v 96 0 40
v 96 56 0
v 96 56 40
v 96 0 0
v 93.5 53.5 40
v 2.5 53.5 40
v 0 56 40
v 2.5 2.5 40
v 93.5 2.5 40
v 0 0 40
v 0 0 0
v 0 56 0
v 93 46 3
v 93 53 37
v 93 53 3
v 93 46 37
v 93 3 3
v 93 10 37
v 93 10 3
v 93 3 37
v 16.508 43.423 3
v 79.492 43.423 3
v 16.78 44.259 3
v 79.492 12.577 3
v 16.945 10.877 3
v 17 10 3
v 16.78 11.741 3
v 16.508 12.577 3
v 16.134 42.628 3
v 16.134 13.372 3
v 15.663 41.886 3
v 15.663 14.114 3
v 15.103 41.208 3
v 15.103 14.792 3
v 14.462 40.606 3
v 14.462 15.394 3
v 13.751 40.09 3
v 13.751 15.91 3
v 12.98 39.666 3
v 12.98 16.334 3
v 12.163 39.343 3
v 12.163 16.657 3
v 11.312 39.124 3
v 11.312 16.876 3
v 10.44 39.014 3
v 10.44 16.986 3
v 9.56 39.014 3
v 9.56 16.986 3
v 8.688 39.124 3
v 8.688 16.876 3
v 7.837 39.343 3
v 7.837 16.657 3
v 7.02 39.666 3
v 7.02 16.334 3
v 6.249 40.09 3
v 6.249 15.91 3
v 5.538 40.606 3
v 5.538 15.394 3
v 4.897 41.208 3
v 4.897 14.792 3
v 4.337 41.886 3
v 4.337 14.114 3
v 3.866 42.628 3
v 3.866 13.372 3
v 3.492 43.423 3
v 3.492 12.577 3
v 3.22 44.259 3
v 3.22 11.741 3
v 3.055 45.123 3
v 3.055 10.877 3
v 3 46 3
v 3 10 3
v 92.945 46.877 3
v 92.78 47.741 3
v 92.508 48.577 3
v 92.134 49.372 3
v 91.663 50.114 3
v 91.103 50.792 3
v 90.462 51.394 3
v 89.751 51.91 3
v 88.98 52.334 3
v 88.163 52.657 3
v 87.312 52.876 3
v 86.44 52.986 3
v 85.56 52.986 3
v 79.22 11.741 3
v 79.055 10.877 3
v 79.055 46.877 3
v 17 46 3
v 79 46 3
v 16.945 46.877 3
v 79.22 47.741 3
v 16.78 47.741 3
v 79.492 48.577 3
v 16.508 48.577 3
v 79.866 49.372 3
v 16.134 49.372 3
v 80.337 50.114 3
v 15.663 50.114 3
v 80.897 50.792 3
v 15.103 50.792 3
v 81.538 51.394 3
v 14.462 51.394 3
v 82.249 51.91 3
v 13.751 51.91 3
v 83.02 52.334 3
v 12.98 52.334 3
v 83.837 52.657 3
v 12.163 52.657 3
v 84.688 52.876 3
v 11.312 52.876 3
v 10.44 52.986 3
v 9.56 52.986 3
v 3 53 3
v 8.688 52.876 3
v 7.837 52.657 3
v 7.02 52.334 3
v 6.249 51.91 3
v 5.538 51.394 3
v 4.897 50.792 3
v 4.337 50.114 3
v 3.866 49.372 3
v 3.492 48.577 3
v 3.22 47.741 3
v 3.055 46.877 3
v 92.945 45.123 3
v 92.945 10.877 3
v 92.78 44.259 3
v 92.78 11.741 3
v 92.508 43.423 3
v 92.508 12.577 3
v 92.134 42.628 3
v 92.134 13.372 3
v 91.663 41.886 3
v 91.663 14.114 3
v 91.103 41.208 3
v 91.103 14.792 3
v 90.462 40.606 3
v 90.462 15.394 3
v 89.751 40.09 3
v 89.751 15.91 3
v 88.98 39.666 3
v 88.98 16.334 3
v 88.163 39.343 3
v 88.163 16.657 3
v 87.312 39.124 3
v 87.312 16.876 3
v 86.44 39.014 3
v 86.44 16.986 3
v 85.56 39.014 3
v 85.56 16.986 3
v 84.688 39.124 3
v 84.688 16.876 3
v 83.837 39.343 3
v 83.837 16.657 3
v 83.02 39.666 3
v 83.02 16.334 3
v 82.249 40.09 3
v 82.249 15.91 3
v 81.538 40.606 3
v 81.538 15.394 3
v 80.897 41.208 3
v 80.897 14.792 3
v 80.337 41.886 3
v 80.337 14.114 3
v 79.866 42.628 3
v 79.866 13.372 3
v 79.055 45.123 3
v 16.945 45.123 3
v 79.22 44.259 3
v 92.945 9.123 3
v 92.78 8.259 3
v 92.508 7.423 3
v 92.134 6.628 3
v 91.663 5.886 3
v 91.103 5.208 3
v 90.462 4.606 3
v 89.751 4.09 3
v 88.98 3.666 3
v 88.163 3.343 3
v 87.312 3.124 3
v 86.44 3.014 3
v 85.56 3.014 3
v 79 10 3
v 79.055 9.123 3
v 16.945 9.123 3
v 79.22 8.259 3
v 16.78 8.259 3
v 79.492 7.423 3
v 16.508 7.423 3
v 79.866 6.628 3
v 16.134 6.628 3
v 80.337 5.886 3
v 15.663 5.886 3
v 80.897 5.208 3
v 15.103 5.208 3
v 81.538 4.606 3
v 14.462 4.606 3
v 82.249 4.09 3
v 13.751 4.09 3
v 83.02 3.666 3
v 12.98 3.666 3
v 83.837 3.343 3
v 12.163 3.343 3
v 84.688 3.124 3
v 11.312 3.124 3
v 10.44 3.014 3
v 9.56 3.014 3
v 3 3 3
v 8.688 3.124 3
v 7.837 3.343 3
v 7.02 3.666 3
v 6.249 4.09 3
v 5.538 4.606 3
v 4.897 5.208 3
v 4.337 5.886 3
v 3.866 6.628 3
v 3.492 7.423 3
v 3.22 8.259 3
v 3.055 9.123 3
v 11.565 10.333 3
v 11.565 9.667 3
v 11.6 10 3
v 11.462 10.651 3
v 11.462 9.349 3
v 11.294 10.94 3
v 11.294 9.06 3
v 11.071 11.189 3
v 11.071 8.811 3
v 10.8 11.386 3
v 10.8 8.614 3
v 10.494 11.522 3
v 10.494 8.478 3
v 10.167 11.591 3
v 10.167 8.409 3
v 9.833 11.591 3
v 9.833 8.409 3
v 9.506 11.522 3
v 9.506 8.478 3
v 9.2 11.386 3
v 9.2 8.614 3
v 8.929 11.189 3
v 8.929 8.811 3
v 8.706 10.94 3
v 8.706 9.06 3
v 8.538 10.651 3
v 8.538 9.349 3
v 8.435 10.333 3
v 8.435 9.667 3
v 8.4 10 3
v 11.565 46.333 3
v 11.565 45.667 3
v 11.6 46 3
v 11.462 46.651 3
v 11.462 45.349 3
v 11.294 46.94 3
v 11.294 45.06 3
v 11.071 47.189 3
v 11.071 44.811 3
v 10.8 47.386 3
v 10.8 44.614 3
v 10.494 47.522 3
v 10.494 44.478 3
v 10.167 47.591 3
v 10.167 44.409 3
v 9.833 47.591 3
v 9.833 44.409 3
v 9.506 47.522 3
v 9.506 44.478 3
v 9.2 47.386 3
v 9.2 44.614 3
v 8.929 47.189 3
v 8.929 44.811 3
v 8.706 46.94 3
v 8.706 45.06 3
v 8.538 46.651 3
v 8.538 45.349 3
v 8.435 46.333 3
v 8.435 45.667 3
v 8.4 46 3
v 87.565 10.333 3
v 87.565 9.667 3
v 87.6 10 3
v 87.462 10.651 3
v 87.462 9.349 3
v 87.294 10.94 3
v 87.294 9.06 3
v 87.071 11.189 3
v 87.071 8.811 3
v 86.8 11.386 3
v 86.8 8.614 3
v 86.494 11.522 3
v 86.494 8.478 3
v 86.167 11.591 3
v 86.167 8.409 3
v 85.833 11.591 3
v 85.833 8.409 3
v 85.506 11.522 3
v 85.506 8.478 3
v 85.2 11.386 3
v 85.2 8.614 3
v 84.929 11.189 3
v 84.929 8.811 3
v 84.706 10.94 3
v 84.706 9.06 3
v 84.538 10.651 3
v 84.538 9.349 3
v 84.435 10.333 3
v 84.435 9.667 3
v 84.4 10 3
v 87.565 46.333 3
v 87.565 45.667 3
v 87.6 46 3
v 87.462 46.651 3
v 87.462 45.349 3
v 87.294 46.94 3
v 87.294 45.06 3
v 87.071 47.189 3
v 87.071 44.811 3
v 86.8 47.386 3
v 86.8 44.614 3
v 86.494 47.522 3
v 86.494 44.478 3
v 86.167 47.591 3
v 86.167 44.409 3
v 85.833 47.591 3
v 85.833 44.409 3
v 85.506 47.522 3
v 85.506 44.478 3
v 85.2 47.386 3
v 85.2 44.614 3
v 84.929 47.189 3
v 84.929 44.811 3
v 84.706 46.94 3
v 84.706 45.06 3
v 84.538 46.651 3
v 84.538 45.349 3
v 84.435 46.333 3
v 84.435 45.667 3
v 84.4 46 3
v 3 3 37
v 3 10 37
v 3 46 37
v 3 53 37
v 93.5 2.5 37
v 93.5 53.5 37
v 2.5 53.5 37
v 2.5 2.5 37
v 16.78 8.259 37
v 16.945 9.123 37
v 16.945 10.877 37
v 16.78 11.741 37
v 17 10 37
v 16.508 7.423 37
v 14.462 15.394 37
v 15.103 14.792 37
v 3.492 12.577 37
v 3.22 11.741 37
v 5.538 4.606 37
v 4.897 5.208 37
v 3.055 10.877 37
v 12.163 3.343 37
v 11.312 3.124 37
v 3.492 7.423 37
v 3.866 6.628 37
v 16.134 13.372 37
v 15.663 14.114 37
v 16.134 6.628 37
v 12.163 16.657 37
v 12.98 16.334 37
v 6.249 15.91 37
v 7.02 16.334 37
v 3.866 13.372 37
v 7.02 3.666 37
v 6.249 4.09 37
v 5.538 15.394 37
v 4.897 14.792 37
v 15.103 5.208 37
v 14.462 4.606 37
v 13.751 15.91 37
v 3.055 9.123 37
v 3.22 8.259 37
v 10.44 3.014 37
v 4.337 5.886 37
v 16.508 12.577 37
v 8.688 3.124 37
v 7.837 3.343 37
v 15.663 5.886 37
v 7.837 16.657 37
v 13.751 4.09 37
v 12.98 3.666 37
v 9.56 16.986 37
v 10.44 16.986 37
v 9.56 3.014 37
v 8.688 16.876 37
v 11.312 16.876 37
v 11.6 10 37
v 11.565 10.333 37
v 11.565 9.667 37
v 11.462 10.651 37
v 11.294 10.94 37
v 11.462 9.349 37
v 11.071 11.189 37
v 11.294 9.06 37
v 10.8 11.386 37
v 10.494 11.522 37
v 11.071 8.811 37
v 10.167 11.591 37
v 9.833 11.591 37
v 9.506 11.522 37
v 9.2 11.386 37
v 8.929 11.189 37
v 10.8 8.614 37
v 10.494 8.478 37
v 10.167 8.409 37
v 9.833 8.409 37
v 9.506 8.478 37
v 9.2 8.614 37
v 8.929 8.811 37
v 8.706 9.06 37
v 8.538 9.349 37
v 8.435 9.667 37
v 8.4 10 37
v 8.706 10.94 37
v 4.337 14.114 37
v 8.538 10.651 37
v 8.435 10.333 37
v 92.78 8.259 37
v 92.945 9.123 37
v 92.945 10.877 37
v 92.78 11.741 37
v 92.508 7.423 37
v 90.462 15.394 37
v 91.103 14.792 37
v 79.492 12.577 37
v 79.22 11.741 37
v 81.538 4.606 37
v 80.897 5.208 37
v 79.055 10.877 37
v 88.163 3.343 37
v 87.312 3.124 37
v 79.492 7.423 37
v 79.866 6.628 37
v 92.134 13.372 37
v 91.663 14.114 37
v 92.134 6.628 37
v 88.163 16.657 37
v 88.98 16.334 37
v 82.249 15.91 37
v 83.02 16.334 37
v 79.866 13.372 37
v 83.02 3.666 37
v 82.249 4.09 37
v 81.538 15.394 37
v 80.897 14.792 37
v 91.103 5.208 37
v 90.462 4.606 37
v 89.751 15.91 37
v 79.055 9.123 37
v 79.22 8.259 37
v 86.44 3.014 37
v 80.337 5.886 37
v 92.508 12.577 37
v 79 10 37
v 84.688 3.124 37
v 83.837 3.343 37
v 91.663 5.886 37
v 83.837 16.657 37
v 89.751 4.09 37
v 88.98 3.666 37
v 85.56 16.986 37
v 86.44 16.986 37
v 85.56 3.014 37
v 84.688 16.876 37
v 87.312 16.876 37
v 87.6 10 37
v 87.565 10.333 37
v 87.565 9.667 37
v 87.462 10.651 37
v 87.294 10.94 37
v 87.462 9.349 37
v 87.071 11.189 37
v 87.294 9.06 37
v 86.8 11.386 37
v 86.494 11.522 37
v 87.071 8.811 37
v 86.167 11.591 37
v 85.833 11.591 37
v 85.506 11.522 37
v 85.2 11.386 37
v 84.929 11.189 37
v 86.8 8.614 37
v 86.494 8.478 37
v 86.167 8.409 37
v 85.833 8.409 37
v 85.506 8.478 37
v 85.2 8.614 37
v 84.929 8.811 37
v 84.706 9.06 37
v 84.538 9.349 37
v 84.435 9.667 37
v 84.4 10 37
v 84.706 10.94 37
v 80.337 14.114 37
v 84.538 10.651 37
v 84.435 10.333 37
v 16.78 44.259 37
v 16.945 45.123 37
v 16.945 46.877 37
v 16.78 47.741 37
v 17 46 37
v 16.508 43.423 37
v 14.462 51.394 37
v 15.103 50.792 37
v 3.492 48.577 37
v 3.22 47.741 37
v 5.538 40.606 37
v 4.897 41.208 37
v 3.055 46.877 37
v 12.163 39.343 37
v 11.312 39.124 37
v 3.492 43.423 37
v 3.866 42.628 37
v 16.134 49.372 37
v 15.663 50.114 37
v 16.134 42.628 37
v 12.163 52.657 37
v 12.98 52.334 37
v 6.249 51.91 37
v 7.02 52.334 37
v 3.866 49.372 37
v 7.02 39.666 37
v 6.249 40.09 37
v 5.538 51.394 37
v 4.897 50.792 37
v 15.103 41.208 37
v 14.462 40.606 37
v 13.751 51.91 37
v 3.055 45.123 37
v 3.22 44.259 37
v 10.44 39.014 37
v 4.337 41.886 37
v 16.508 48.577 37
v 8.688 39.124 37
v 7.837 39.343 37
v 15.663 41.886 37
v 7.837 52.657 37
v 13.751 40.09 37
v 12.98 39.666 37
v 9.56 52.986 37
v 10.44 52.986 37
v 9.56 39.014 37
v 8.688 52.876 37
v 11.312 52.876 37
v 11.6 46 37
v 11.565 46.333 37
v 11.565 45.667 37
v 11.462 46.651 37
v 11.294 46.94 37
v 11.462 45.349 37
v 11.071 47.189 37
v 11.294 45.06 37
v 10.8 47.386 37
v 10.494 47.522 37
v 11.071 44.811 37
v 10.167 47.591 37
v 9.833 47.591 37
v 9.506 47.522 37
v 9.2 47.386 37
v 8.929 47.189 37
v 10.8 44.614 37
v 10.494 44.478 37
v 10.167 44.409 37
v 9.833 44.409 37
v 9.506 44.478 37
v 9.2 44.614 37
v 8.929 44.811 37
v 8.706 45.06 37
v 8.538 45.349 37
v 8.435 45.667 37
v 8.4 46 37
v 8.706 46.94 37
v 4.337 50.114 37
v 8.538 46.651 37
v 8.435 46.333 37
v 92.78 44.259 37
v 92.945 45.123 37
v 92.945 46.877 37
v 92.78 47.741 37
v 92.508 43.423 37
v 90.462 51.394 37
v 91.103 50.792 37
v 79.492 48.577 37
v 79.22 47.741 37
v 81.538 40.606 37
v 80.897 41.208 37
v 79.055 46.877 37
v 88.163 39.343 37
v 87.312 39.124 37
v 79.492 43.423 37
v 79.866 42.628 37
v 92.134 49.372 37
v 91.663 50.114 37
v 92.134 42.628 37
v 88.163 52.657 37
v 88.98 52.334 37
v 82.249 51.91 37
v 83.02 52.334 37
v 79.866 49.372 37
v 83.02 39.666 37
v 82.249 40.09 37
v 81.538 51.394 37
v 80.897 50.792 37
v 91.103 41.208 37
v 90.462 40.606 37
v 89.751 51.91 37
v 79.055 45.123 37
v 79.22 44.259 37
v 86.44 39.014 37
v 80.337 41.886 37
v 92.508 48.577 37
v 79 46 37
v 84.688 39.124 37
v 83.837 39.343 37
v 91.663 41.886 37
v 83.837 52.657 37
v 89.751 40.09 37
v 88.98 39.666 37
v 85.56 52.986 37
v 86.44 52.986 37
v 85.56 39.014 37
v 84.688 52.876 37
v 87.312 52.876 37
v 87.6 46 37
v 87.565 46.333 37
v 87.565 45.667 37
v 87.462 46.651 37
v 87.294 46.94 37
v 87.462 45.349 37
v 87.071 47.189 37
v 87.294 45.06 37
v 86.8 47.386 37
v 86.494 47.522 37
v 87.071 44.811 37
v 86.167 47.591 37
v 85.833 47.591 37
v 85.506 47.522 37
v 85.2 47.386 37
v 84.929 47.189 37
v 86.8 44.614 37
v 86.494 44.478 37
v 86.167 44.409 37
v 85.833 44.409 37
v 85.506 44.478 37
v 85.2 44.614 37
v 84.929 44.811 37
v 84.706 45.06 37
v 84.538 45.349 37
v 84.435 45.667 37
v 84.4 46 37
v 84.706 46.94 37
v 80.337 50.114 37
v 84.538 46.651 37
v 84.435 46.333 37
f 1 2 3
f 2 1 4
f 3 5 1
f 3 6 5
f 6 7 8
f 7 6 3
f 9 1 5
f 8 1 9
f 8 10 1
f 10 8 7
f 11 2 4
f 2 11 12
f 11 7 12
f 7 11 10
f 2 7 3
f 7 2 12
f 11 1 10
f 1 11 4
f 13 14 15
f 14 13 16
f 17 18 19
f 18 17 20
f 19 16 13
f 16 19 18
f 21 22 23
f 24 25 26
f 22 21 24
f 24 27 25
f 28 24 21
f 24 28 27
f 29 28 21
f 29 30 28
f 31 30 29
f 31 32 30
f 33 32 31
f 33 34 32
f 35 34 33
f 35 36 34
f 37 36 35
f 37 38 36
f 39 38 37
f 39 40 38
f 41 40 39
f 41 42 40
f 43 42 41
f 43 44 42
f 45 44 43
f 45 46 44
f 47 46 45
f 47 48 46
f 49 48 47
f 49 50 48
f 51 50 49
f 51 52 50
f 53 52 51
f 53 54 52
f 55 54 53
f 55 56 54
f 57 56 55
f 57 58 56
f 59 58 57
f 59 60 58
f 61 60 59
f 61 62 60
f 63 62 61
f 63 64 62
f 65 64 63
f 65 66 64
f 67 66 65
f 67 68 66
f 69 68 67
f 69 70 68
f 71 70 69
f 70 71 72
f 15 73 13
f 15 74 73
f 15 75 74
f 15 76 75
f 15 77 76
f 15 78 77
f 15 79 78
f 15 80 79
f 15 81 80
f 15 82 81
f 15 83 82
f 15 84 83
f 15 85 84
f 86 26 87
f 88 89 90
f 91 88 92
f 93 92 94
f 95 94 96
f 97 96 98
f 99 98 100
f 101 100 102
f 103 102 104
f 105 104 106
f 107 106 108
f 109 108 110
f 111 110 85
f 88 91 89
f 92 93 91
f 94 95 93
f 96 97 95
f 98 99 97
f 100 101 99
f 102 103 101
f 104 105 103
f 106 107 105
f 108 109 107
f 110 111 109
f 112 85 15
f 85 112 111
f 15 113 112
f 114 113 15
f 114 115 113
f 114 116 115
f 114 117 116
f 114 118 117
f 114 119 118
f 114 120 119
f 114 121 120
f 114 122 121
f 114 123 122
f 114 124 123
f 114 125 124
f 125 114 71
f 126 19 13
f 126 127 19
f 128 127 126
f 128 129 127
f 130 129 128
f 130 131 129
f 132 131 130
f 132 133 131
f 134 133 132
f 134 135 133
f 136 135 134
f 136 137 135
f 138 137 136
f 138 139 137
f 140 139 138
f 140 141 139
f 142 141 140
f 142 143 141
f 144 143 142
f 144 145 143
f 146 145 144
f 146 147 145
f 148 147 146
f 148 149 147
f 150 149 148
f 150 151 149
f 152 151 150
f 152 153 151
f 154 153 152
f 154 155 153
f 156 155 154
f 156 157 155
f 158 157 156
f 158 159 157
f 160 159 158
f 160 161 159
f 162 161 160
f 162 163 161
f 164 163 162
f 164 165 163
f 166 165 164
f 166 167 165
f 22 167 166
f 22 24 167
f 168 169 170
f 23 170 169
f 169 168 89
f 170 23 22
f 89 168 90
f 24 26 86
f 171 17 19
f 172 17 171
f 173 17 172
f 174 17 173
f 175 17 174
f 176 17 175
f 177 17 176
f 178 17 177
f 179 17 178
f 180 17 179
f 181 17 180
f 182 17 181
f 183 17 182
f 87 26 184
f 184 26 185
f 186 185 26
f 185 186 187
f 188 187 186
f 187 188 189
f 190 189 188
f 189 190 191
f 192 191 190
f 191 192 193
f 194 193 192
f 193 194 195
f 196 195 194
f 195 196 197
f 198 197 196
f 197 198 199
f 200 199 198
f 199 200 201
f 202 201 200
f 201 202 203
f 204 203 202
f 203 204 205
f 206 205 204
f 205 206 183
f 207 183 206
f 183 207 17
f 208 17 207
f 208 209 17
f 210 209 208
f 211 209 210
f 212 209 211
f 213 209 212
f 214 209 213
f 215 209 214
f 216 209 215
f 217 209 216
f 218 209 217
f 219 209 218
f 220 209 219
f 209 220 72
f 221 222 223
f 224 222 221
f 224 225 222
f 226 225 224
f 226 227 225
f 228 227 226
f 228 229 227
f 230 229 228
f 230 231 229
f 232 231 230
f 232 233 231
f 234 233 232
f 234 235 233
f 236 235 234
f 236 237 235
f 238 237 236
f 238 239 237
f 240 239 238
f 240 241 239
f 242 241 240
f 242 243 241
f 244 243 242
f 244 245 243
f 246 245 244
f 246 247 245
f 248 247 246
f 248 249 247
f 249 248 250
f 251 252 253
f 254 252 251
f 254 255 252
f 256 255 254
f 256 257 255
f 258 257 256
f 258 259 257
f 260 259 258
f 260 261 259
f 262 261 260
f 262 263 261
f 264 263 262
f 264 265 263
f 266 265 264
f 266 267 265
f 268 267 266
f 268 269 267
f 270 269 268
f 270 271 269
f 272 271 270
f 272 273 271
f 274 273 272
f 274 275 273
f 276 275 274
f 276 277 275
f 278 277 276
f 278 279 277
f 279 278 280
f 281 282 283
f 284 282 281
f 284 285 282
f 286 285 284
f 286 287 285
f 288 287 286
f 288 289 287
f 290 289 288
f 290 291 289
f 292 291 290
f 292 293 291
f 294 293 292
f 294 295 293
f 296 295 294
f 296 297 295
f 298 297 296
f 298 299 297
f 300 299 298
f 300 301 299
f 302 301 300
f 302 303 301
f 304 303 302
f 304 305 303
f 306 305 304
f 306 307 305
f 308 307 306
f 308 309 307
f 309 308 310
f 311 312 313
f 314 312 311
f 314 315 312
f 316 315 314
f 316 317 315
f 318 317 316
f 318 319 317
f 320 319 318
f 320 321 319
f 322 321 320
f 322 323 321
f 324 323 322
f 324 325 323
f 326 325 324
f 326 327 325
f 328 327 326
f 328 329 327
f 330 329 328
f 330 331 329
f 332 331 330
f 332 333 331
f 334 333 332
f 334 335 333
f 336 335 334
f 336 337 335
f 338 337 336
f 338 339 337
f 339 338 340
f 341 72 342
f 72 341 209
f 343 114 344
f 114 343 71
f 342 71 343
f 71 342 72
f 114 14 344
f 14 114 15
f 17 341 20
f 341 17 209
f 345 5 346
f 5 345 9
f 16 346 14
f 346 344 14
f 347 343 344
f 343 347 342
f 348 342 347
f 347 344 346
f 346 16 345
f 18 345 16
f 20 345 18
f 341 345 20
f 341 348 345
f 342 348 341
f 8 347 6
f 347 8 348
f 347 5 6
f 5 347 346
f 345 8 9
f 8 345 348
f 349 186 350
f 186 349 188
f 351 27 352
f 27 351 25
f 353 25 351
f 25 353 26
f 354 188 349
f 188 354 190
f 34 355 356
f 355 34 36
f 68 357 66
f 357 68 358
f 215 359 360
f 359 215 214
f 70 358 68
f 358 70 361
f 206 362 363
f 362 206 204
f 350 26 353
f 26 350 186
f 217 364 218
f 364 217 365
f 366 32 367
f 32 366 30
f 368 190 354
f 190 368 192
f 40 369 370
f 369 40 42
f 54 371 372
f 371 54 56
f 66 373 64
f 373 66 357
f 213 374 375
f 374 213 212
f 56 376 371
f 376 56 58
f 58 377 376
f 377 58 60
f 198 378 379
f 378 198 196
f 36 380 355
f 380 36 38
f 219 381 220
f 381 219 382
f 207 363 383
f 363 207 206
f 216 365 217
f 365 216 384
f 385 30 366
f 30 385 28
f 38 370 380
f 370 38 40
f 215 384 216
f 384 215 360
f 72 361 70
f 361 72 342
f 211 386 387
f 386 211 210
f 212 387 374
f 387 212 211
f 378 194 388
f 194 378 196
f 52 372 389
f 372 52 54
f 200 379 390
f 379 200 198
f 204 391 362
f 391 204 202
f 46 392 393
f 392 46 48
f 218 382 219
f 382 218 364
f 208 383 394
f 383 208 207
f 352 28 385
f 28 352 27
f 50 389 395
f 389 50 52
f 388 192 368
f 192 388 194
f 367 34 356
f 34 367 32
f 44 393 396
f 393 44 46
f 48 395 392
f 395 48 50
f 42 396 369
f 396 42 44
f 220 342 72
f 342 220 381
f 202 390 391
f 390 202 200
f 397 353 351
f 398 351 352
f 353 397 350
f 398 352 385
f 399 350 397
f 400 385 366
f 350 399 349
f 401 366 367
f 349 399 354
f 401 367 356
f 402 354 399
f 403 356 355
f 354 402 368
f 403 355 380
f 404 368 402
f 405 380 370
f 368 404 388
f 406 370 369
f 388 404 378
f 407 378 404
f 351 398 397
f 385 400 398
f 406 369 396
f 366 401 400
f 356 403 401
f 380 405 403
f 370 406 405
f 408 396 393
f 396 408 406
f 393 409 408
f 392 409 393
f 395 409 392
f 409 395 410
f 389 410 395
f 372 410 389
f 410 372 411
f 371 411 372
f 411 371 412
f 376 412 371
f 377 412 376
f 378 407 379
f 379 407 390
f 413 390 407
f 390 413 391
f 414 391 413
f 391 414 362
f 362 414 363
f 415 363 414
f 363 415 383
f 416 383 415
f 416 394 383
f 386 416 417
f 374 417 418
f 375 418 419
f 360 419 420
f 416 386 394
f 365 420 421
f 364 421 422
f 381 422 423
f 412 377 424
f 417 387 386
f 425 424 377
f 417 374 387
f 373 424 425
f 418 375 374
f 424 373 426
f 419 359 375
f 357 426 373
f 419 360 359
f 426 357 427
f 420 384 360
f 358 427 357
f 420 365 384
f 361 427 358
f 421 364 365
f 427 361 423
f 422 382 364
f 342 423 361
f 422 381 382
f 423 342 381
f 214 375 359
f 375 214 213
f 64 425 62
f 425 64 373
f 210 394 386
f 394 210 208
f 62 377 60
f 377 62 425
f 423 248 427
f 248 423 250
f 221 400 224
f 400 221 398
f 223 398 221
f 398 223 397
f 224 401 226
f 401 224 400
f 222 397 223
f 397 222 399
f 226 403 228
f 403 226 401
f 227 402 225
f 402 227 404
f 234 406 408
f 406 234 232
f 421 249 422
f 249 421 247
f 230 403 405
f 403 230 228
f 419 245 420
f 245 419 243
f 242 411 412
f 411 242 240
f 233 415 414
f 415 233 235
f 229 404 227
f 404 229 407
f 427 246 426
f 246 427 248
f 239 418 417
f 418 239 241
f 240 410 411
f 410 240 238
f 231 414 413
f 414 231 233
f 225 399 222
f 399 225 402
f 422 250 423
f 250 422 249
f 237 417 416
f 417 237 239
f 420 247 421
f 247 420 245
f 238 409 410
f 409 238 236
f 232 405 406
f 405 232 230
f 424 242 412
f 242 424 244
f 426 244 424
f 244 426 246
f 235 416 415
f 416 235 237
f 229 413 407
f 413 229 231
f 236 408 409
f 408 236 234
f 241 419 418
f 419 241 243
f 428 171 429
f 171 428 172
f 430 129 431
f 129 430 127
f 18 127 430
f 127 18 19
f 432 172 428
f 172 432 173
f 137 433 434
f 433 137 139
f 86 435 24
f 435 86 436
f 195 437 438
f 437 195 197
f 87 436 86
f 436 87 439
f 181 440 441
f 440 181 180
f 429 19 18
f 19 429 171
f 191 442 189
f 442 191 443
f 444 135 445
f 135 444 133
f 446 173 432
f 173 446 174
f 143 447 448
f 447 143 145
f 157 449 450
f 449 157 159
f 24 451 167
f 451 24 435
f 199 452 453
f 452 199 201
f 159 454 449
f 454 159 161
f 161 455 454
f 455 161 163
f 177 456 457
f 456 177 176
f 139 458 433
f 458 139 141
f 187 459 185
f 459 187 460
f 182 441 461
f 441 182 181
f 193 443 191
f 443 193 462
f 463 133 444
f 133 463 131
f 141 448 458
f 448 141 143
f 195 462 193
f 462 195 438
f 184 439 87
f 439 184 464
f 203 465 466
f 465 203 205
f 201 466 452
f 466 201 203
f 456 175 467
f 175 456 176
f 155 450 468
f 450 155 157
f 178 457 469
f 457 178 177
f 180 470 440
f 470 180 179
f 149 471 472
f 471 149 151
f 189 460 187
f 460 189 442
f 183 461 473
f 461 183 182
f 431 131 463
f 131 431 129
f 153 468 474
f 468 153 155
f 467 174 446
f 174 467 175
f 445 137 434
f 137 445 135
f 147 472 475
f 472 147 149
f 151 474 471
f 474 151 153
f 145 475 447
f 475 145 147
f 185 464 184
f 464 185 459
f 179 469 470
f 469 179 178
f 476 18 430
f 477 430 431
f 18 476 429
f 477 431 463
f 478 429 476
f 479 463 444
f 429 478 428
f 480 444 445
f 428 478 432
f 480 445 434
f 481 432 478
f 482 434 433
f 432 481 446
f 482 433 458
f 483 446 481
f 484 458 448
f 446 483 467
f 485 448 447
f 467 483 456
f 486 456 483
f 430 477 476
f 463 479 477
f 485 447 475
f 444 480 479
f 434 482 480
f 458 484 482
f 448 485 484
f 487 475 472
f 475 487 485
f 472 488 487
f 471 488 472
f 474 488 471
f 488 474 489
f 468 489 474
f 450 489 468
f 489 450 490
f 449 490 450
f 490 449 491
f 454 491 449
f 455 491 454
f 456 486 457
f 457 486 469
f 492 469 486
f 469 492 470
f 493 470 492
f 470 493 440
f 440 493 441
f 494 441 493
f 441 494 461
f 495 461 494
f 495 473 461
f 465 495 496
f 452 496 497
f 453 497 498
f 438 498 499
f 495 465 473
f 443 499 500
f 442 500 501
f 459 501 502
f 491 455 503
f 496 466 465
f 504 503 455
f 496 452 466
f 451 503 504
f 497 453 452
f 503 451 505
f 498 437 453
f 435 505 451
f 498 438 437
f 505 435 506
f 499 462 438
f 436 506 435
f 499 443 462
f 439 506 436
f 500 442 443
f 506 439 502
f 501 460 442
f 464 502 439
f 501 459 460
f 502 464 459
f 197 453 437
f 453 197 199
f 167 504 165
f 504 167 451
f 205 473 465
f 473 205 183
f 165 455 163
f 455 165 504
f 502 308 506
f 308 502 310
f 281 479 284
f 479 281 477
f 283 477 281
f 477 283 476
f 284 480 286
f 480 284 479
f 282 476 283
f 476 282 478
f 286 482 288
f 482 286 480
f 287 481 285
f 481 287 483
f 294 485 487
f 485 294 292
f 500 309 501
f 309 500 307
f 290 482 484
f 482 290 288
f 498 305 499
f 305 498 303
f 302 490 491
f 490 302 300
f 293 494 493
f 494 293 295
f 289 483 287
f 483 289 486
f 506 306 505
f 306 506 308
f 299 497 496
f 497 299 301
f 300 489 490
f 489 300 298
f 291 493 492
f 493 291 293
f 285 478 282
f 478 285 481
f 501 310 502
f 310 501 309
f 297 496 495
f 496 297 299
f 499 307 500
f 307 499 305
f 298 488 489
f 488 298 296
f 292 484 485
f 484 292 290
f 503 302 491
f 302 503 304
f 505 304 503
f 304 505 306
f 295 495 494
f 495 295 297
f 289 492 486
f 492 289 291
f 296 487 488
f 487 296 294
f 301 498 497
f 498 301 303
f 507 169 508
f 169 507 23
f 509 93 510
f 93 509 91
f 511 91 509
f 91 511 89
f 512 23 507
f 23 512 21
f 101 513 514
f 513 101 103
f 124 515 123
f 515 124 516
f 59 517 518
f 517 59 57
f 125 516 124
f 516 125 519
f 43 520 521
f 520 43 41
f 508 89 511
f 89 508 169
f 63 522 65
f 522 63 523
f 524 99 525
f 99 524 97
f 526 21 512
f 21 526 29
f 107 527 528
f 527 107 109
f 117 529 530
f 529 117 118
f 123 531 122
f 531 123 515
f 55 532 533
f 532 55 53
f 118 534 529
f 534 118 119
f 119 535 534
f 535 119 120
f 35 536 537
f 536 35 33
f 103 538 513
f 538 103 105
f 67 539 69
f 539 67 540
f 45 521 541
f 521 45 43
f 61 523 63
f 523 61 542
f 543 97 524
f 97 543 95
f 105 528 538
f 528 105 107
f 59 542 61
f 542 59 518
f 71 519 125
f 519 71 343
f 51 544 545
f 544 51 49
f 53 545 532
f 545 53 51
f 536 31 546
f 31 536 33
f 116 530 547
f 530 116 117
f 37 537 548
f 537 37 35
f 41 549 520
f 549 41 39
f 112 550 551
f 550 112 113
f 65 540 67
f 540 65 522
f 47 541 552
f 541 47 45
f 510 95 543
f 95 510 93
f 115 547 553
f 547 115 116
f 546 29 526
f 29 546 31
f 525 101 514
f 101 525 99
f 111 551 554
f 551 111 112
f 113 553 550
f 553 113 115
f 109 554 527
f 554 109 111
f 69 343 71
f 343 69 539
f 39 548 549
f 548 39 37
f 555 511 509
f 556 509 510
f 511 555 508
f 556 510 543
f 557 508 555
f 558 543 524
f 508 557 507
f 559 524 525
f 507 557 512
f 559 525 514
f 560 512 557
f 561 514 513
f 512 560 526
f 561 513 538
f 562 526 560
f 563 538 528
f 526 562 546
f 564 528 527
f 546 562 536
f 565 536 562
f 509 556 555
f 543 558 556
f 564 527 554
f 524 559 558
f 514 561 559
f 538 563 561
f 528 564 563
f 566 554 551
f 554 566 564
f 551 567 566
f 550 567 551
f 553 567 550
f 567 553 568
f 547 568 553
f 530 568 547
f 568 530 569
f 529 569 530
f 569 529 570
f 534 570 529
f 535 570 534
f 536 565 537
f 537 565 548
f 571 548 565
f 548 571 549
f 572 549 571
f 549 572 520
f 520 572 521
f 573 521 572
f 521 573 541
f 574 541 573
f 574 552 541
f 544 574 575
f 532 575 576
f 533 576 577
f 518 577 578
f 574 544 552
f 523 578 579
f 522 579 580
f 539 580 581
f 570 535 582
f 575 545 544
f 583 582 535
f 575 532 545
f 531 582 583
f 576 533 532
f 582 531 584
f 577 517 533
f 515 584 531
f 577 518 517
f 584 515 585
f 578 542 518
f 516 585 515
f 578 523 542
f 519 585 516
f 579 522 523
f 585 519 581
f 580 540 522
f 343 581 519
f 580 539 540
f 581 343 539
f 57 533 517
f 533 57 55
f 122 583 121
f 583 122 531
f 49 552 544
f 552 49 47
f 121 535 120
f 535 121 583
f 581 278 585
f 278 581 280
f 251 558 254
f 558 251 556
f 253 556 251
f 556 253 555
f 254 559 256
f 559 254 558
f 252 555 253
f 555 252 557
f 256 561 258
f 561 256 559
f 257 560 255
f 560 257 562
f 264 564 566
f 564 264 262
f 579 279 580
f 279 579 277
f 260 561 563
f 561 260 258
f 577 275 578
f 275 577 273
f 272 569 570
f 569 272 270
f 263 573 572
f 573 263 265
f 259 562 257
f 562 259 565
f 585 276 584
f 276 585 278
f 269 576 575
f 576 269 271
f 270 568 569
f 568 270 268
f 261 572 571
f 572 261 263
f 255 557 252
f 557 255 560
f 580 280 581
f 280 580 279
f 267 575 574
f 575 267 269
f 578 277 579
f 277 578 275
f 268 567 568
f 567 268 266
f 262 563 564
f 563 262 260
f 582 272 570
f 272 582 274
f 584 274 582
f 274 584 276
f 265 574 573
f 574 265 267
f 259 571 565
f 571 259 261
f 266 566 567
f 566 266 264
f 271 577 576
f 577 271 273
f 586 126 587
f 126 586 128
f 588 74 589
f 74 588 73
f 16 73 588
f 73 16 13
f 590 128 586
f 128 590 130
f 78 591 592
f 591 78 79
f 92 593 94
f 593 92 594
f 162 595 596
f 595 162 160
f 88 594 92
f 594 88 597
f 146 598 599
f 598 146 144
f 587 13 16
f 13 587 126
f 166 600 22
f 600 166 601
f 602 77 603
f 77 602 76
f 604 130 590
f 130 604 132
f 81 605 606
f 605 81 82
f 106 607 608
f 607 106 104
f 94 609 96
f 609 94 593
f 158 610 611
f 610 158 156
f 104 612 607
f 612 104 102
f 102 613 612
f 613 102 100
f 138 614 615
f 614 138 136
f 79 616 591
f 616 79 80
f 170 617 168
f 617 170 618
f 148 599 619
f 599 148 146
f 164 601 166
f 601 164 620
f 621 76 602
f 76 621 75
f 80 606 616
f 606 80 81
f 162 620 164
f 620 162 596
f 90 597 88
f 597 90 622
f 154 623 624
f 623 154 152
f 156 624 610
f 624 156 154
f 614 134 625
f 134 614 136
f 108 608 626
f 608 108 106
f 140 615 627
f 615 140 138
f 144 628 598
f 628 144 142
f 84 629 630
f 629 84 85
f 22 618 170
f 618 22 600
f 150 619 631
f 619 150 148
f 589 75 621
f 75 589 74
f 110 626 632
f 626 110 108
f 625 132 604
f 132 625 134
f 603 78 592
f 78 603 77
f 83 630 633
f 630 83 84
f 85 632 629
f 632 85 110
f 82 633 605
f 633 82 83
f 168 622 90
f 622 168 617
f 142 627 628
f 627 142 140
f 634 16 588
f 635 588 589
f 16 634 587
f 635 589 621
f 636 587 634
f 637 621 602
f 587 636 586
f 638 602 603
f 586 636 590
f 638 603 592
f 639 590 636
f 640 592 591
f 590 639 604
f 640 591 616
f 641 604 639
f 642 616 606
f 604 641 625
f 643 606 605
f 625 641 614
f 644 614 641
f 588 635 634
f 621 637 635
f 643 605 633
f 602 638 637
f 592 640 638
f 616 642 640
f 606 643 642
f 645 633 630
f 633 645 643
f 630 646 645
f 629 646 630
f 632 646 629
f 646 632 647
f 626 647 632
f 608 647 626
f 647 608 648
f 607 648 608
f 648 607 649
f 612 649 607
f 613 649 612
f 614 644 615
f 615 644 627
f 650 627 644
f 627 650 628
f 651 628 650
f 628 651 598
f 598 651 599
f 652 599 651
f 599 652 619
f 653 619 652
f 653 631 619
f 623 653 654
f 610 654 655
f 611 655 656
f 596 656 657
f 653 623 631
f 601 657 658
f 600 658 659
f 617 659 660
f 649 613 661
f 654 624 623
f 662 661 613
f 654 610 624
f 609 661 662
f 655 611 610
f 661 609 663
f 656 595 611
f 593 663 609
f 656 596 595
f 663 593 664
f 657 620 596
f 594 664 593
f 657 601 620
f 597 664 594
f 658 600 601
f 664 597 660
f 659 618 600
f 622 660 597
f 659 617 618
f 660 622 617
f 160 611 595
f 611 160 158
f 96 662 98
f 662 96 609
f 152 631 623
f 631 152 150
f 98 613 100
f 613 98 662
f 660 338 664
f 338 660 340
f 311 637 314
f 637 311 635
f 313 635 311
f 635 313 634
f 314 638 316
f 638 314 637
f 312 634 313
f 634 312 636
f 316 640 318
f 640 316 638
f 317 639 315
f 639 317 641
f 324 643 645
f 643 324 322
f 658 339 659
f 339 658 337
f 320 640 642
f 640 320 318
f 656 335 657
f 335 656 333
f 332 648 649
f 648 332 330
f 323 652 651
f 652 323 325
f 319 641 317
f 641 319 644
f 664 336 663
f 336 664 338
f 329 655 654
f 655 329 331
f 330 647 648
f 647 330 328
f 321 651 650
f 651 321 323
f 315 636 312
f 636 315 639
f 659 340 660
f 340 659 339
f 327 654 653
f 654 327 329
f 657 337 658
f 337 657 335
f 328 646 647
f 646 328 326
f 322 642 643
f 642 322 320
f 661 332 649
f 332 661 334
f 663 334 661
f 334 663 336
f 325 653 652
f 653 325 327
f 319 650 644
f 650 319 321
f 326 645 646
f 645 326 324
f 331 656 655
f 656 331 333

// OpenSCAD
// Parametri principali del box
panel_width = 90;   // Sostituisci con la larghezza del tuo pannello
panel_length = 50;   // Sostituisci con la lunghezza del tuo pannello
box_height = 40;     // Altezza fissa richiesta[cite: 1]
wall_thickness = 3;  // Spessore delle pareti
lip = 2;             // Tolleranza per l'alloggiamento del pannello
corner_pillar_radius = 7; // Raggio delle colonnine per le viti
screw_hole_radius = 1.6;  // Raggio per viti M3 (3mm di diametro)

module corner_pillars() {
    // Posizionamento delle 4 colonnine agli angoli interni
    translate([wall_thickness + corner_pillar_radius, wall_thickness + corner_pillar_radius, 0])
        pillar();
    translate([wall_thickness + panel_width - corner_pillar_radius, wall_thickness + corner_pillar_radius, 0])
        pillar();
    translate([wall_thickness + corner_pillar_radius, wall_thickness + panel_length - corner_pillar_radius, 0])
        pillar();
    translate([wall_thickness + panel_width - corner_pillar_radius, wall_thickness + panel_length - corner_pillar_radius, 0])
        pillar();
}

module pillar() {
    difference() {
        cylinder(h = box_height - wall_thickness, r = corner_pillar_radius, $fn=50);
        // Foro per la vite
        translate([0, 0, -1])
            cylinder(h = box_height + 2, r = screw_hole_radius, $fn=30);
    }
}

module enclosure() {
    outer_w = panel_width + (wall_thickness * 2);
    outer_l = panel_length + (wall_thickness * 2);
    
    difference() {
        // Scatola esterna piena
        cube([outer_w, outer_l, box_height]);
        
        // Svuotamento interno della scatola
        translate([wall_thickness, wall_thickness, wall_thickness])
            cube([panel_width, panel_length, box_height]);
            
        // Scasso superiore per incassare il pannello a filo
        translate([wall_thickness - 0.5, wall_thickness - 0.5, box_height - 3])
            cube([panel_width + 1, panel_length + 1, 4]);
    }
    
    // Aggiunta delle colonnine angolari interne
    corner_pillars();
}

enclosure();
